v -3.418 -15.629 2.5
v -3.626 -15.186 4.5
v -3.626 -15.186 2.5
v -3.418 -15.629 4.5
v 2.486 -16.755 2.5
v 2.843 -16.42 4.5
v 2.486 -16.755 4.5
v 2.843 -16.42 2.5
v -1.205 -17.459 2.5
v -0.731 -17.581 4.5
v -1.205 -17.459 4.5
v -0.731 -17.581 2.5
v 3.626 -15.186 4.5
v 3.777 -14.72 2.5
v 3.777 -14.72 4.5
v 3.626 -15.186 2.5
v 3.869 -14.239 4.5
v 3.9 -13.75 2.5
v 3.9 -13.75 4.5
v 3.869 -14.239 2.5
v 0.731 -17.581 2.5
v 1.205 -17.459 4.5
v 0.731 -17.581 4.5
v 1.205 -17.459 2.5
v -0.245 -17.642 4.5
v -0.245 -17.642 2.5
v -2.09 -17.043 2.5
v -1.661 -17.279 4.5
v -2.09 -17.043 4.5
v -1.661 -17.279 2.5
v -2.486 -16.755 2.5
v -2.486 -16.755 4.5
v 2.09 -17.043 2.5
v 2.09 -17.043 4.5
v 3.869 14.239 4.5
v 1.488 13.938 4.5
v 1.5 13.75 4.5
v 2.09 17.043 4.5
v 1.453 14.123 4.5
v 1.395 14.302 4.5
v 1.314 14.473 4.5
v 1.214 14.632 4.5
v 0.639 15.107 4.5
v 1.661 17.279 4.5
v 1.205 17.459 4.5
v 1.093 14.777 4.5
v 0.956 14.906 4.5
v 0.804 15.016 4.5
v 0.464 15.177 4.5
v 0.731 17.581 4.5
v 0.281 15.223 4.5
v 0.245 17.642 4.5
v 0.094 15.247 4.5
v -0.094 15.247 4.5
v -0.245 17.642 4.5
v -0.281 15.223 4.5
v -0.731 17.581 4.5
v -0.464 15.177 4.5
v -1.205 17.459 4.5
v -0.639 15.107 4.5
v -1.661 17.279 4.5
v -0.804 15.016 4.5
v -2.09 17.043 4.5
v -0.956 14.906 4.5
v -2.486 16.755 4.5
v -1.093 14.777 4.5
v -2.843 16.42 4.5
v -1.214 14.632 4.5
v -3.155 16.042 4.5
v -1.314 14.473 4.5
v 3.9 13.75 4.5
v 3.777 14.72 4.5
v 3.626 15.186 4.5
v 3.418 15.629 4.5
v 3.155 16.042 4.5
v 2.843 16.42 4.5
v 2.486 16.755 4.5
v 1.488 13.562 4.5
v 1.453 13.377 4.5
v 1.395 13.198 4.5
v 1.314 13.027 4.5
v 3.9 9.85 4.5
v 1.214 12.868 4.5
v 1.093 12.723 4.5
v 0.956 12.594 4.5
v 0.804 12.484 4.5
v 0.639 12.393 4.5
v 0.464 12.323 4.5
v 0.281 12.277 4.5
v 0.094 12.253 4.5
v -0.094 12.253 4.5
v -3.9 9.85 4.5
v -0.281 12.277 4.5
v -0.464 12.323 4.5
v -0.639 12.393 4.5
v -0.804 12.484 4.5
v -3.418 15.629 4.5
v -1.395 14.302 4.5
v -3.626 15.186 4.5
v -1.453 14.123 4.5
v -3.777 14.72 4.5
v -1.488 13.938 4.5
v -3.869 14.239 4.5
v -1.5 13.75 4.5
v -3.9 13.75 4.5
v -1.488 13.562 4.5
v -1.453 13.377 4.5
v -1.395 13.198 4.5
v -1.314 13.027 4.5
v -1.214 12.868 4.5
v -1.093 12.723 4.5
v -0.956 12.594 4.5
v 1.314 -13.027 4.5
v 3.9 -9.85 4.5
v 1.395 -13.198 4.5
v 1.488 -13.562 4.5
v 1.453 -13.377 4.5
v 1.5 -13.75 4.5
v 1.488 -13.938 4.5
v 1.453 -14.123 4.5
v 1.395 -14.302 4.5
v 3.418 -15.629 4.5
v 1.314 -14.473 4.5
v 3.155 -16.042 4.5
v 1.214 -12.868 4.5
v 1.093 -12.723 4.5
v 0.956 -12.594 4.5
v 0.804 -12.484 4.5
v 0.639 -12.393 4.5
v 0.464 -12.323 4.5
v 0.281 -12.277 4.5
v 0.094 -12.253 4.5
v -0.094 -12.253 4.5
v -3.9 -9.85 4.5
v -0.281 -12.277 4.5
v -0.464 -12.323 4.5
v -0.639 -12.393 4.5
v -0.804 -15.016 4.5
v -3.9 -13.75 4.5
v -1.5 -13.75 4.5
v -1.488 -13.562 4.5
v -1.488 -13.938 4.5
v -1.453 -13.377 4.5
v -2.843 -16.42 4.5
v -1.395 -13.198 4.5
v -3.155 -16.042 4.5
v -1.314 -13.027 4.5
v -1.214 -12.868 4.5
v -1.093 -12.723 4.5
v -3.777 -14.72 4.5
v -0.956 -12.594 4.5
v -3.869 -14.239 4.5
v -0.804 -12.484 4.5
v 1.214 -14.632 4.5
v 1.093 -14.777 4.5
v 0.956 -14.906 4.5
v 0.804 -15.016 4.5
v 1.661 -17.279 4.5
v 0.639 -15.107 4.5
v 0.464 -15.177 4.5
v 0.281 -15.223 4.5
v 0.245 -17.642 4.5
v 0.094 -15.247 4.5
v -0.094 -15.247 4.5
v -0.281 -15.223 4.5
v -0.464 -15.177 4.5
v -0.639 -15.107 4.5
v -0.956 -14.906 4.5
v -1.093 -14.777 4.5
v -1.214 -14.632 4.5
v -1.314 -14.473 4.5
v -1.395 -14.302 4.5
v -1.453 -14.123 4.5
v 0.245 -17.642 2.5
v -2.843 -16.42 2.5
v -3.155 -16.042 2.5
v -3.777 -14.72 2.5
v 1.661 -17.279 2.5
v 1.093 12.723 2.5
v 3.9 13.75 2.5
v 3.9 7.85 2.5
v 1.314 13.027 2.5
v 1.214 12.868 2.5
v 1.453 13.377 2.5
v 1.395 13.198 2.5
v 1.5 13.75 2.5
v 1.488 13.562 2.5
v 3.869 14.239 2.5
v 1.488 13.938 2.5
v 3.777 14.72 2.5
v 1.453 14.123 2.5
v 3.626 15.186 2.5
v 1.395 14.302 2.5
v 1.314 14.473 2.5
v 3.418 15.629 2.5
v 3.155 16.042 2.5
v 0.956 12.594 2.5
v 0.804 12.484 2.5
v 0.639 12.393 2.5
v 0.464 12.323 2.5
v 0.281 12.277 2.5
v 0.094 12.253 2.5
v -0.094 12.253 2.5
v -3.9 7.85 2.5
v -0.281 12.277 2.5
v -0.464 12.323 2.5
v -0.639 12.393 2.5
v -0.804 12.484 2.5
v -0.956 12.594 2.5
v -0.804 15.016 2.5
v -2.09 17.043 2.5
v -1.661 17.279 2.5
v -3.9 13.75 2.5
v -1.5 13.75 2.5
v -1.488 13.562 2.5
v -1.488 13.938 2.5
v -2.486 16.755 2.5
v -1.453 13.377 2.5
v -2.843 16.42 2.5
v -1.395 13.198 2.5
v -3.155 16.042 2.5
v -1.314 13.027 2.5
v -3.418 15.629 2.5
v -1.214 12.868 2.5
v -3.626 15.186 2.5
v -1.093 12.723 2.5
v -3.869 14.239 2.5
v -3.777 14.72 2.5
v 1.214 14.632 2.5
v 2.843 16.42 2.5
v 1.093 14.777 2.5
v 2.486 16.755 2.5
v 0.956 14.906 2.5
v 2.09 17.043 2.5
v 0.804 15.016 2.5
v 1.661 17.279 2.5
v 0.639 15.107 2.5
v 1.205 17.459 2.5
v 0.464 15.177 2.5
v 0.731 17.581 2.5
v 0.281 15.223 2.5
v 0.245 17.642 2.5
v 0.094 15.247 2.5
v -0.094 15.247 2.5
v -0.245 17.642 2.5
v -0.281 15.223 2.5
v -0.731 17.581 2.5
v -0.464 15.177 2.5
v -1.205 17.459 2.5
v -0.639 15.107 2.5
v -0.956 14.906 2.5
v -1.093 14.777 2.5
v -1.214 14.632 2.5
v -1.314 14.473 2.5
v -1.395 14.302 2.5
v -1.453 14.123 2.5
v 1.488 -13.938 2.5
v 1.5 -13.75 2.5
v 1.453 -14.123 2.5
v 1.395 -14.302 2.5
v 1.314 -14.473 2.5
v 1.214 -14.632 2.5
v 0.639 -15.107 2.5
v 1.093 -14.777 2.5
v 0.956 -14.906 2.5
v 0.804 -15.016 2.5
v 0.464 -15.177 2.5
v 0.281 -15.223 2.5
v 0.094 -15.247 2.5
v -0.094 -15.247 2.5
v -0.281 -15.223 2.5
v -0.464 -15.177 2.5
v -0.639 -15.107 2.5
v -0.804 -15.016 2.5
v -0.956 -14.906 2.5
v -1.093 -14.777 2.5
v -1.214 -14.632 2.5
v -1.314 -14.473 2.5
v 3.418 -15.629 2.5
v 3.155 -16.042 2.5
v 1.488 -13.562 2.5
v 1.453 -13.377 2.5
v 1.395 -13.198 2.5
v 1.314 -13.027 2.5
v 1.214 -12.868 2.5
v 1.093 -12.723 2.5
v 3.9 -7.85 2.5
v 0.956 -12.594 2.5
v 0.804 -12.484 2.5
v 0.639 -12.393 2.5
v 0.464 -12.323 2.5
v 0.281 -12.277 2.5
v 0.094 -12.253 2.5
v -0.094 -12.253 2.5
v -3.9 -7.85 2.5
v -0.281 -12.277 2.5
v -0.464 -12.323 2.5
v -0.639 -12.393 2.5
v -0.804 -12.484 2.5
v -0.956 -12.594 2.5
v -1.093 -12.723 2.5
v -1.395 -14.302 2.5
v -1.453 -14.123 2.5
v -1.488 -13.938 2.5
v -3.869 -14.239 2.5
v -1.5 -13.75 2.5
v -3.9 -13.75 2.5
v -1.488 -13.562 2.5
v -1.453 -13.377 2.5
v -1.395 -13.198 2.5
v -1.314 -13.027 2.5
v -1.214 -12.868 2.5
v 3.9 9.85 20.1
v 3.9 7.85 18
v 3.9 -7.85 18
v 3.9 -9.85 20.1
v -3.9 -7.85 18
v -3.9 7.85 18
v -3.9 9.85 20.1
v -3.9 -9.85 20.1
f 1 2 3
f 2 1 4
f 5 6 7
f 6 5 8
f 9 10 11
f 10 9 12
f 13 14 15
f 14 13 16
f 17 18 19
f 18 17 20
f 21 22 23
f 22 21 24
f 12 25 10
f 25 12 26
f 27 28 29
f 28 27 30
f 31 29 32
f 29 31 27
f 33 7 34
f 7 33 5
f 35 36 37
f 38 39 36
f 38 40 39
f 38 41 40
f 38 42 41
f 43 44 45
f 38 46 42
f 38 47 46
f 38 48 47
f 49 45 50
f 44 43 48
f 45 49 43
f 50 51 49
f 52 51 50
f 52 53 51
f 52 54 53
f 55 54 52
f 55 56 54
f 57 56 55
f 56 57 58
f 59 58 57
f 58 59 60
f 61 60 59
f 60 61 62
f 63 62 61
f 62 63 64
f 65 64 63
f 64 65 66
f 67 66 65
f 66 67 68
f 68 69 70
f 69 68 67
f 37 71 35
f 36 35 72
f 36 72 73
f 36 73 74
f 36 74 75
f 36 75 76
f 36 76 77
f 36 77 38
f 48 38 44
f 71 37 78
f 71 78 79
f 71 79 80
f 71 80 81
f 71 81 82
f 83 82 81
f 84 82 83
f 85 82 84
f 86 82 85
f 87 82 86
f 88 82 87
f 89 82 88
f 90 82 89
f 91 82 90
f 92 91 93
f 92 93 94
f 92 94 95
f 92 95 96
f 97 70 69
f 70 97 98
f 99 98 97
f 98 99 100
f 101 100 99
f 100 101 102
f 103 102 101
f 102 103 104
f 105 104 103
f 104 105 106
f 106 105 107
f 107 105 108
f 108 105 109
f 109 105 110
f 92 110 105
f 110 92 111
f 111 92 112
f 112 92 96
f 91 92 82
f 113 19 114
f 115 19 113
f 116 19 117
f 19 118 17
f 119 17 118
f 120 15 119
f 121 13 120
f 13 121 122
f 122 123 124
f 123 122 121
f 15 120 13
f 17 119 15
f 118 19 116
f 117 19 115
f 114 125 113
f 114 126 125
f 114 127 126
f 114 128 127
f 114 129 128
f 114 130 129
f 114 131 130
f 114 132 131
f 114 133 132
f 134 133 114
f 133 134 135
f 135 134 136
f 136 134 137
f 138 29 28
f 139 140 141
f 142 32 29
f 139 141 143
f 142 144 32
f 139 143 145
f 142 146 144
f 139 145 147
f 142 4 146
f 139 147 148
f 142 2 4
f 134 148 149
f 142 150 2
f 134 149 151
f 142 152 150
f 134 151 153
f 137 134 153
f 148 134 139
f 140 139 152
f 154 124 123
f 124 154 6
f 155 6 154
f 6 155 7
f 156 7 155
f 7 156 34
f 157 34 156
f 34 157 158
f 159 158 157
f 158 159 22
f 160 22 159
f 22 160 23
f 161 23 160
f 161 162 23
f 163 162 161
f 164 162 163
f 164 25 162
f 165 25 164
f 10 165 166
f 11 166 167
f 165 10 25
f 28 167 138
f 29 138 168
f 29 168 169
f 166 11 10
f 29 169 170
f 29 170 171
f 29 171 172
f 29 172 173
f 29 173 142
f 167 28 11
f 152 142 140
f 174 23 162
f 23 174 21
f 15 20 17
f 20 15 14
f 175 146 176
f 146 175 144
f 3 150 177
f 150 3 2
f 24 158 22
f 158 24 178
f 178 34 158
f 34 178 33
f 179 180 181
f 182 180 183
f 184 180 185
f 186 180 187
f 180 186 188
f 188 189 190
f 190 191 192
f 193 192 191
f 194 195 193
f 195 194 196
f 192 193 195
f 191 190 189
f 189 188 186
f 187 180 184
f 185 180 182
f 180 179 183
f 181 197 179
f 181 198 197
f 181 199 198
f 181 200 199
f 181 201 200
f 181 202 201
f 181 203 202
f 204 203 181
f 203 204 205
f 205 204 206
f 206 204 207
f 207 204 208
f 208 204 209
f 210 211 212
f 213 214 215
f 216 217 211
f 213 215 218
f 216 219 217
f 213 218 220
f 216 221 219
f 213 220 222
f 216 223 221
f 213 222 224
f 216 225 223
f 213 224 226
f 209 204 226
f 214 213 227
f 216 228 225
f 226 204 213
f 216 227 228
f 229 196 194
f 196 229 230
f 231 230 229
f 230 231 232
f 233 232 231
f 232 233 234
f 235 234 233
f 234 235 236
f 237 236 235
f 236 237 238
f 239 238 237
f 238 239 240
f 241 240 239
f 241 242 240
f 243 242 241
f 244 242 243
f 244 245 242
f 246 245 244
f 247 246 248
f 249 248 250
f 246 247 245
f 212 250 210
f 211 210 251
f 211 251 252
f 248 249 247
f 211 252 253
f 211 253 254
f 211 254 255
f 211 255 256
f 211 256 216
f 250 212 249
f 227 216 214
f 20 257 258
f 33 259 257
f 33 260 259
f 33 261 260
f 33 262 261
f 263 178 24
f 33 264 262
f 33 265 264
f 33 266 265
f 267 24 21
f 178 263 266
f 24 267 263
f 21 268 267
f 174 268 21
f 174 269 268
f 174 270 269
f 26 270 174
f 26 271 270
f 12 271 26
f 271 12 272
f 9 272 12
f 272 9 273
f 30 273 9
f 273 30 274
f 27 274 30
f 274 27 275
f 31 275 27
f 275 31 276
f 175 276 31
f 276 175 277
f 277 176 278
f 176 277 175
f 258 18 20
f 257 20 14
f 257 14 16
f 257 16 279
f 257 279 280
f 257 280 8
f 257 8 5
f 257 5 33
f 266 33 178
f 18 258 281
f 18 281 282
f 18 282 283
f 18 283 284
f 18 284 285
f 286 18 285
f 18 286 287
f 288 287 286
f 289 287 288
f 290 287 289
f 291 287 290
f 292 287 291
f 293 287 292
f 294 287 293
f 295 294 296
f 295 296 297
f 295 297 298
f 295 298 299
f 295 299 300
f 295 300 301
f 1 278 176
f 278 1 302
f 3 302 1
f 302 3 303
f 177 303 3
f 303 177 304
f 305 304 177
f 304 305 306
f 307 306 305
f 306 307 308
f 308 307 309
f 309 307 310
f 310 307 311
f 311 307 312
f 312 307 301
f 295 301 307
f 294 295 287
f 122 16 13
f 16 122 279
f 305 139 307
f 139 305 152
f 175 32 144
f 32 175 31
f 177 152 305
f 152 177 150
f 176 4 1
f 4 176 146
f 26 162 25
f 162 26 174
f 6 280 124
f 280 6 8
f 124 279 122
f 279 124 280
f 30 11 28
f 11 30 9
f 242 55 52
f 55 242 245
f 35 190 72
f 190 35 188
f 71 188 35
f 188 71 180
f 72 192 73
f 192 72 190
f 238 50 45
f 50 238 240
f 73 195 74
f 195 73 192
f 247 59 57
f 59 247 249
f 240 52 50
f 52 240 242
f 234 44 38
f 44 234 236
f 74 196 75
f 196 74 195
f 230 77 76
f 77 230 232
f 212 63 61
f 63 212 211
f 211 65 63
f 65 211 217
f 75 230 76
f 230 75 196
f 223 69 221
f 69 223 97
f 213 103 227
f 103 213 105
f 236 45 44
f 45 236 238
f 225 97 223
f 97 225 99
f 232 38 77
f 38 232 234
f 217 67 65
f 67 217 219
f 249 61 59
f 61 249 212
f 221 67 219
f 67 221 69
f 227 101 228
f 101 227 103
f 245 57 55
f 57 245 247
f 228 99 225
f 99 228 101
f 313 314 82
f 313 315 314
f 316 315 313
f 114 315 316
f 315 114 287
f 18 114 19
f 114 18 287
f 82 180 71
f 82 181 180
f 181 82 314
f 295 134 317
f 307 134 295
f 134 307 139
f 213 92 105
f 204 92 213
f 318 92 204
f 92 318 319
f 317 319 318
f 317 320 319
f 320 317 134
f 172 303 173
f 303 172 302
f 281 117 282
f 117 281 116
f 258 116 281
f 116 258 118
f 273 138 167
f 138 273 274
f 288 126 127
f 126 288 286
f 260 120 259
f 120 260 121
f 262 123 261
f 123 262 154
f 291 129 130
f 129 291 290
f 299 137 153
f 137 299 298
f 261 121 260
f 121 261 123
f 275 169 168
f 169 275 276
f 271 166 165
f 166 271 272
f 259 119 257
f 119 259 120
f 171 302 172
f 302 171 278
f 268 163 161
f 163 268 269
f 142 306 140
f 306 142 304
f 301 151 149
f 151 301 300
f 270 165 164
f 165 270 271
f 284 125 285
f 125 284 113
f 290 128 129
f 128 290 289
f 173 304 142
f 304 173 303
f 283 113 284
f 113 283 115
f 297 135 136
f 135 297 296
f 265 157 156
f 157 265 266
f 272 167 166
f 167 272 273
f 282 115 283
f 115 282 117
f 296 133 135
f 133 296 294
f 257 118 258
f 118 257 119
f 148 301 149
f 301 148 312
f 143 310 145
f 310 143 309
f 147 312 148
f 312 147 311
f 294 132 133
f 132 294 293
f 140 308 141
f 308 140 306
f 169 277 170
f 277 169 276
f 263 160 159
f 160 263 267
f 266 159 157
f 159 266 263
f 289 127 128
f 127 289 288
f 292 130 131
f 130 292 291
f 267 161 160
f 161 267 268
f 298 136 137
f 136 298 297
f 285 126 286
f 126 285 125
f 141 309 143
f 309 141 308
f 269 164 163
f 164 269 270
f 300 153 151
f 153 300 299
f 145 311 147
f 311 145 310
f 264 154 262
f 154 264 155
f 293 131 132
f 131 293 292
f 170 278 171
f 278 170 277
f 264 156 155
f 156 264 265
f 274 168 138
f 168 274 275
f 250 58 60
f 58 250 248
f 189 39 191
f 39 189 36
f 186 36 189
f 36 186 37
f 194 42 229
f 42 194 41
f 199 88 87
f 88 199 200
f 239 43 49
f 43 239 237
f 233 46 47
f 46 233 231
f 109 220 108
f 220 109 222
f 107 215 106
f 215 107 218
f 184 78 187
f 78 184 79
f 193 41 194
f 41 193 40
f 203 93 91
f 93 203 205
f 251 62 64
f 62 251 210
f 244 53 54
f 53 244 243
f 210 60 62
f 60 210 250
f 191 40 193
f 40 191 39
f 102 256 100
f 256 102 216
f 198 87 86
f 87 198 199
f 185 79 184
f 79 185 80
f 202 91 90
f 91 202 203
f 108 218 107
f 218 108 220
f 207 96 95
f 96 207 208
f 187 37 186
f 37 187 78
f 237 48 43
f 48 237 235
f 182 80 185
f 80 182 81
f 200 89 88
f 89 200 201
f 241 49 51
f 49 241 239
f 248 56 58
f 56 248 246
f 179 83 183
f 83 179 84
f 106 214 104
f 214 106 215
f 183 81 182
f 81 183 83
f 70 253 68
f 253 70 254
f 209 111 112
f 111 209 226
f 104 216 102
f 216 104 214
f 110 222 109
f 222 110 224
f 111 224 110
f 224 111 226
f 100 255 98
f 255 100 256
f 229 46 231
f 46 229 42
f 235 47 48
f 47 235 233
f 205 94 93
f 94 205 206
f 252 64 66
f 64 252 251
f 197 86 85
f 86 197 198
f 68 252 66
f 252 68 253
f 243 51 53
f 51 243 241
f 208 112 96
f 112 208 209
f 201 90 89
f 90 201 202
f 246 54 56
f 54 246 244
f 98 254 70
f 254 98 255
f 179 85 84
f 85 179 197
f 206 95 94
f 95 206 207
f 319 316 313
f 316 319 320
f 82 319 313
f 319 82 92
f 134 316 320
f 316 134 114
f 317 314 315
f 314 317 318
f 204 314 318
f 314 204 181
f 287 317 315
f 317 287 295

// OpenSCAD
$fn = 50;

gap = 0.2;
wall = 2;

relay_sz_x = 19;
relay_sz_y = 15.3;
relay_sz_z = 15.4;

holder_h = 5;
hole_d = 3.8;
ear_sz_x = wall * 2 + hole_d;
ear_sz_y = wall * 2 + hole_d;

module bottom_part() {
  difference() {
    union() {
      translate([0, 0, (holder_h+wall)/2]) {
        cube([relay_sz_x+2*gap+2*wall, relay_sz_y+2*gap+2*wall, holder_h+wall], center=true);
      }
      translate([0, 0, wall/2]) {
        cube([ear_sz_x, relay_sz_y+2*gap+2*wall+ear_sz_y, wall], center=true);
        for(sgn=[-1,1]) {
          translate([0, sgn*(relay_sz_y+2*gap+2*wall+ear_sz_y)/2, -wall/2]) {
            cylinder(d=ear_sz_y, h=wall);
          }
        }
      }
    }
    translate([0, 0, holder_h/2+wall]) {
      cube([relay_sz_x+2*gap, relay_sz_y+2*gap, holder_h], center=true);
      cube([10, relay_sz_y+2*gap+2*wall, holder_h], center=true);
    }
    for(sgn=[-1,1]) {
      translate([0, sgn*(relay_sz_y+2*gap+2*wall+ear_sz_y)/2, -25]) {
        cylinder(d=hole_d, h=50);
      }
    }
  }
}

module top_part() {
  translate([0, 0, (relay_sz_z+gap+wall)/2+wall]) {
    difference() {
      union() {
        cube([ear_sz_x, relay_sz_y+2*gap+2*wall, relay_sz_z+wall+gap], center=true);
        translate([0, 0, -(relay_sz_z+gap)/2]) {
          difference() {
            union() {
              cube([ear_sz_x, relay_sz_y+2*gap+2*wall+ear_sz_y, wall], center=true);
              for(sgn=[-1, 1]) {
//                hull() {
//                  translate([0, sgn*(relay_sz_y+2*gap+wall)/2, 4]) {
//                    cube([ear_sz_x, wall, 8], center=true);
//                  }
                  translate([0, sgn*(relay_sz_y+2*gap+2*wall+ear_sz_y)/2, 0]) {
                    cylinder(d=ear_sz_y, h=wall, center=true);
                  }
//                }
              }
            }
            for(sgn=[-1,1]) {
              translate([0, sgn*(relay_sz_y+2*gap+2*wall+ear_sz_y)/2, -wall/2]) {
                cylinder(d=3, h=20);
              }
            }
          }
        }
      }
      translate([0, 0, -(wall+gap)/2]) {
        cube([ear_sz_x, relay_sz_y+2*gap, relay_sz_z+gap], center=true);
      }
    }
  }
}

translate([0, 0, 0.5]) {
  top_part();
}
//bottom_part();
